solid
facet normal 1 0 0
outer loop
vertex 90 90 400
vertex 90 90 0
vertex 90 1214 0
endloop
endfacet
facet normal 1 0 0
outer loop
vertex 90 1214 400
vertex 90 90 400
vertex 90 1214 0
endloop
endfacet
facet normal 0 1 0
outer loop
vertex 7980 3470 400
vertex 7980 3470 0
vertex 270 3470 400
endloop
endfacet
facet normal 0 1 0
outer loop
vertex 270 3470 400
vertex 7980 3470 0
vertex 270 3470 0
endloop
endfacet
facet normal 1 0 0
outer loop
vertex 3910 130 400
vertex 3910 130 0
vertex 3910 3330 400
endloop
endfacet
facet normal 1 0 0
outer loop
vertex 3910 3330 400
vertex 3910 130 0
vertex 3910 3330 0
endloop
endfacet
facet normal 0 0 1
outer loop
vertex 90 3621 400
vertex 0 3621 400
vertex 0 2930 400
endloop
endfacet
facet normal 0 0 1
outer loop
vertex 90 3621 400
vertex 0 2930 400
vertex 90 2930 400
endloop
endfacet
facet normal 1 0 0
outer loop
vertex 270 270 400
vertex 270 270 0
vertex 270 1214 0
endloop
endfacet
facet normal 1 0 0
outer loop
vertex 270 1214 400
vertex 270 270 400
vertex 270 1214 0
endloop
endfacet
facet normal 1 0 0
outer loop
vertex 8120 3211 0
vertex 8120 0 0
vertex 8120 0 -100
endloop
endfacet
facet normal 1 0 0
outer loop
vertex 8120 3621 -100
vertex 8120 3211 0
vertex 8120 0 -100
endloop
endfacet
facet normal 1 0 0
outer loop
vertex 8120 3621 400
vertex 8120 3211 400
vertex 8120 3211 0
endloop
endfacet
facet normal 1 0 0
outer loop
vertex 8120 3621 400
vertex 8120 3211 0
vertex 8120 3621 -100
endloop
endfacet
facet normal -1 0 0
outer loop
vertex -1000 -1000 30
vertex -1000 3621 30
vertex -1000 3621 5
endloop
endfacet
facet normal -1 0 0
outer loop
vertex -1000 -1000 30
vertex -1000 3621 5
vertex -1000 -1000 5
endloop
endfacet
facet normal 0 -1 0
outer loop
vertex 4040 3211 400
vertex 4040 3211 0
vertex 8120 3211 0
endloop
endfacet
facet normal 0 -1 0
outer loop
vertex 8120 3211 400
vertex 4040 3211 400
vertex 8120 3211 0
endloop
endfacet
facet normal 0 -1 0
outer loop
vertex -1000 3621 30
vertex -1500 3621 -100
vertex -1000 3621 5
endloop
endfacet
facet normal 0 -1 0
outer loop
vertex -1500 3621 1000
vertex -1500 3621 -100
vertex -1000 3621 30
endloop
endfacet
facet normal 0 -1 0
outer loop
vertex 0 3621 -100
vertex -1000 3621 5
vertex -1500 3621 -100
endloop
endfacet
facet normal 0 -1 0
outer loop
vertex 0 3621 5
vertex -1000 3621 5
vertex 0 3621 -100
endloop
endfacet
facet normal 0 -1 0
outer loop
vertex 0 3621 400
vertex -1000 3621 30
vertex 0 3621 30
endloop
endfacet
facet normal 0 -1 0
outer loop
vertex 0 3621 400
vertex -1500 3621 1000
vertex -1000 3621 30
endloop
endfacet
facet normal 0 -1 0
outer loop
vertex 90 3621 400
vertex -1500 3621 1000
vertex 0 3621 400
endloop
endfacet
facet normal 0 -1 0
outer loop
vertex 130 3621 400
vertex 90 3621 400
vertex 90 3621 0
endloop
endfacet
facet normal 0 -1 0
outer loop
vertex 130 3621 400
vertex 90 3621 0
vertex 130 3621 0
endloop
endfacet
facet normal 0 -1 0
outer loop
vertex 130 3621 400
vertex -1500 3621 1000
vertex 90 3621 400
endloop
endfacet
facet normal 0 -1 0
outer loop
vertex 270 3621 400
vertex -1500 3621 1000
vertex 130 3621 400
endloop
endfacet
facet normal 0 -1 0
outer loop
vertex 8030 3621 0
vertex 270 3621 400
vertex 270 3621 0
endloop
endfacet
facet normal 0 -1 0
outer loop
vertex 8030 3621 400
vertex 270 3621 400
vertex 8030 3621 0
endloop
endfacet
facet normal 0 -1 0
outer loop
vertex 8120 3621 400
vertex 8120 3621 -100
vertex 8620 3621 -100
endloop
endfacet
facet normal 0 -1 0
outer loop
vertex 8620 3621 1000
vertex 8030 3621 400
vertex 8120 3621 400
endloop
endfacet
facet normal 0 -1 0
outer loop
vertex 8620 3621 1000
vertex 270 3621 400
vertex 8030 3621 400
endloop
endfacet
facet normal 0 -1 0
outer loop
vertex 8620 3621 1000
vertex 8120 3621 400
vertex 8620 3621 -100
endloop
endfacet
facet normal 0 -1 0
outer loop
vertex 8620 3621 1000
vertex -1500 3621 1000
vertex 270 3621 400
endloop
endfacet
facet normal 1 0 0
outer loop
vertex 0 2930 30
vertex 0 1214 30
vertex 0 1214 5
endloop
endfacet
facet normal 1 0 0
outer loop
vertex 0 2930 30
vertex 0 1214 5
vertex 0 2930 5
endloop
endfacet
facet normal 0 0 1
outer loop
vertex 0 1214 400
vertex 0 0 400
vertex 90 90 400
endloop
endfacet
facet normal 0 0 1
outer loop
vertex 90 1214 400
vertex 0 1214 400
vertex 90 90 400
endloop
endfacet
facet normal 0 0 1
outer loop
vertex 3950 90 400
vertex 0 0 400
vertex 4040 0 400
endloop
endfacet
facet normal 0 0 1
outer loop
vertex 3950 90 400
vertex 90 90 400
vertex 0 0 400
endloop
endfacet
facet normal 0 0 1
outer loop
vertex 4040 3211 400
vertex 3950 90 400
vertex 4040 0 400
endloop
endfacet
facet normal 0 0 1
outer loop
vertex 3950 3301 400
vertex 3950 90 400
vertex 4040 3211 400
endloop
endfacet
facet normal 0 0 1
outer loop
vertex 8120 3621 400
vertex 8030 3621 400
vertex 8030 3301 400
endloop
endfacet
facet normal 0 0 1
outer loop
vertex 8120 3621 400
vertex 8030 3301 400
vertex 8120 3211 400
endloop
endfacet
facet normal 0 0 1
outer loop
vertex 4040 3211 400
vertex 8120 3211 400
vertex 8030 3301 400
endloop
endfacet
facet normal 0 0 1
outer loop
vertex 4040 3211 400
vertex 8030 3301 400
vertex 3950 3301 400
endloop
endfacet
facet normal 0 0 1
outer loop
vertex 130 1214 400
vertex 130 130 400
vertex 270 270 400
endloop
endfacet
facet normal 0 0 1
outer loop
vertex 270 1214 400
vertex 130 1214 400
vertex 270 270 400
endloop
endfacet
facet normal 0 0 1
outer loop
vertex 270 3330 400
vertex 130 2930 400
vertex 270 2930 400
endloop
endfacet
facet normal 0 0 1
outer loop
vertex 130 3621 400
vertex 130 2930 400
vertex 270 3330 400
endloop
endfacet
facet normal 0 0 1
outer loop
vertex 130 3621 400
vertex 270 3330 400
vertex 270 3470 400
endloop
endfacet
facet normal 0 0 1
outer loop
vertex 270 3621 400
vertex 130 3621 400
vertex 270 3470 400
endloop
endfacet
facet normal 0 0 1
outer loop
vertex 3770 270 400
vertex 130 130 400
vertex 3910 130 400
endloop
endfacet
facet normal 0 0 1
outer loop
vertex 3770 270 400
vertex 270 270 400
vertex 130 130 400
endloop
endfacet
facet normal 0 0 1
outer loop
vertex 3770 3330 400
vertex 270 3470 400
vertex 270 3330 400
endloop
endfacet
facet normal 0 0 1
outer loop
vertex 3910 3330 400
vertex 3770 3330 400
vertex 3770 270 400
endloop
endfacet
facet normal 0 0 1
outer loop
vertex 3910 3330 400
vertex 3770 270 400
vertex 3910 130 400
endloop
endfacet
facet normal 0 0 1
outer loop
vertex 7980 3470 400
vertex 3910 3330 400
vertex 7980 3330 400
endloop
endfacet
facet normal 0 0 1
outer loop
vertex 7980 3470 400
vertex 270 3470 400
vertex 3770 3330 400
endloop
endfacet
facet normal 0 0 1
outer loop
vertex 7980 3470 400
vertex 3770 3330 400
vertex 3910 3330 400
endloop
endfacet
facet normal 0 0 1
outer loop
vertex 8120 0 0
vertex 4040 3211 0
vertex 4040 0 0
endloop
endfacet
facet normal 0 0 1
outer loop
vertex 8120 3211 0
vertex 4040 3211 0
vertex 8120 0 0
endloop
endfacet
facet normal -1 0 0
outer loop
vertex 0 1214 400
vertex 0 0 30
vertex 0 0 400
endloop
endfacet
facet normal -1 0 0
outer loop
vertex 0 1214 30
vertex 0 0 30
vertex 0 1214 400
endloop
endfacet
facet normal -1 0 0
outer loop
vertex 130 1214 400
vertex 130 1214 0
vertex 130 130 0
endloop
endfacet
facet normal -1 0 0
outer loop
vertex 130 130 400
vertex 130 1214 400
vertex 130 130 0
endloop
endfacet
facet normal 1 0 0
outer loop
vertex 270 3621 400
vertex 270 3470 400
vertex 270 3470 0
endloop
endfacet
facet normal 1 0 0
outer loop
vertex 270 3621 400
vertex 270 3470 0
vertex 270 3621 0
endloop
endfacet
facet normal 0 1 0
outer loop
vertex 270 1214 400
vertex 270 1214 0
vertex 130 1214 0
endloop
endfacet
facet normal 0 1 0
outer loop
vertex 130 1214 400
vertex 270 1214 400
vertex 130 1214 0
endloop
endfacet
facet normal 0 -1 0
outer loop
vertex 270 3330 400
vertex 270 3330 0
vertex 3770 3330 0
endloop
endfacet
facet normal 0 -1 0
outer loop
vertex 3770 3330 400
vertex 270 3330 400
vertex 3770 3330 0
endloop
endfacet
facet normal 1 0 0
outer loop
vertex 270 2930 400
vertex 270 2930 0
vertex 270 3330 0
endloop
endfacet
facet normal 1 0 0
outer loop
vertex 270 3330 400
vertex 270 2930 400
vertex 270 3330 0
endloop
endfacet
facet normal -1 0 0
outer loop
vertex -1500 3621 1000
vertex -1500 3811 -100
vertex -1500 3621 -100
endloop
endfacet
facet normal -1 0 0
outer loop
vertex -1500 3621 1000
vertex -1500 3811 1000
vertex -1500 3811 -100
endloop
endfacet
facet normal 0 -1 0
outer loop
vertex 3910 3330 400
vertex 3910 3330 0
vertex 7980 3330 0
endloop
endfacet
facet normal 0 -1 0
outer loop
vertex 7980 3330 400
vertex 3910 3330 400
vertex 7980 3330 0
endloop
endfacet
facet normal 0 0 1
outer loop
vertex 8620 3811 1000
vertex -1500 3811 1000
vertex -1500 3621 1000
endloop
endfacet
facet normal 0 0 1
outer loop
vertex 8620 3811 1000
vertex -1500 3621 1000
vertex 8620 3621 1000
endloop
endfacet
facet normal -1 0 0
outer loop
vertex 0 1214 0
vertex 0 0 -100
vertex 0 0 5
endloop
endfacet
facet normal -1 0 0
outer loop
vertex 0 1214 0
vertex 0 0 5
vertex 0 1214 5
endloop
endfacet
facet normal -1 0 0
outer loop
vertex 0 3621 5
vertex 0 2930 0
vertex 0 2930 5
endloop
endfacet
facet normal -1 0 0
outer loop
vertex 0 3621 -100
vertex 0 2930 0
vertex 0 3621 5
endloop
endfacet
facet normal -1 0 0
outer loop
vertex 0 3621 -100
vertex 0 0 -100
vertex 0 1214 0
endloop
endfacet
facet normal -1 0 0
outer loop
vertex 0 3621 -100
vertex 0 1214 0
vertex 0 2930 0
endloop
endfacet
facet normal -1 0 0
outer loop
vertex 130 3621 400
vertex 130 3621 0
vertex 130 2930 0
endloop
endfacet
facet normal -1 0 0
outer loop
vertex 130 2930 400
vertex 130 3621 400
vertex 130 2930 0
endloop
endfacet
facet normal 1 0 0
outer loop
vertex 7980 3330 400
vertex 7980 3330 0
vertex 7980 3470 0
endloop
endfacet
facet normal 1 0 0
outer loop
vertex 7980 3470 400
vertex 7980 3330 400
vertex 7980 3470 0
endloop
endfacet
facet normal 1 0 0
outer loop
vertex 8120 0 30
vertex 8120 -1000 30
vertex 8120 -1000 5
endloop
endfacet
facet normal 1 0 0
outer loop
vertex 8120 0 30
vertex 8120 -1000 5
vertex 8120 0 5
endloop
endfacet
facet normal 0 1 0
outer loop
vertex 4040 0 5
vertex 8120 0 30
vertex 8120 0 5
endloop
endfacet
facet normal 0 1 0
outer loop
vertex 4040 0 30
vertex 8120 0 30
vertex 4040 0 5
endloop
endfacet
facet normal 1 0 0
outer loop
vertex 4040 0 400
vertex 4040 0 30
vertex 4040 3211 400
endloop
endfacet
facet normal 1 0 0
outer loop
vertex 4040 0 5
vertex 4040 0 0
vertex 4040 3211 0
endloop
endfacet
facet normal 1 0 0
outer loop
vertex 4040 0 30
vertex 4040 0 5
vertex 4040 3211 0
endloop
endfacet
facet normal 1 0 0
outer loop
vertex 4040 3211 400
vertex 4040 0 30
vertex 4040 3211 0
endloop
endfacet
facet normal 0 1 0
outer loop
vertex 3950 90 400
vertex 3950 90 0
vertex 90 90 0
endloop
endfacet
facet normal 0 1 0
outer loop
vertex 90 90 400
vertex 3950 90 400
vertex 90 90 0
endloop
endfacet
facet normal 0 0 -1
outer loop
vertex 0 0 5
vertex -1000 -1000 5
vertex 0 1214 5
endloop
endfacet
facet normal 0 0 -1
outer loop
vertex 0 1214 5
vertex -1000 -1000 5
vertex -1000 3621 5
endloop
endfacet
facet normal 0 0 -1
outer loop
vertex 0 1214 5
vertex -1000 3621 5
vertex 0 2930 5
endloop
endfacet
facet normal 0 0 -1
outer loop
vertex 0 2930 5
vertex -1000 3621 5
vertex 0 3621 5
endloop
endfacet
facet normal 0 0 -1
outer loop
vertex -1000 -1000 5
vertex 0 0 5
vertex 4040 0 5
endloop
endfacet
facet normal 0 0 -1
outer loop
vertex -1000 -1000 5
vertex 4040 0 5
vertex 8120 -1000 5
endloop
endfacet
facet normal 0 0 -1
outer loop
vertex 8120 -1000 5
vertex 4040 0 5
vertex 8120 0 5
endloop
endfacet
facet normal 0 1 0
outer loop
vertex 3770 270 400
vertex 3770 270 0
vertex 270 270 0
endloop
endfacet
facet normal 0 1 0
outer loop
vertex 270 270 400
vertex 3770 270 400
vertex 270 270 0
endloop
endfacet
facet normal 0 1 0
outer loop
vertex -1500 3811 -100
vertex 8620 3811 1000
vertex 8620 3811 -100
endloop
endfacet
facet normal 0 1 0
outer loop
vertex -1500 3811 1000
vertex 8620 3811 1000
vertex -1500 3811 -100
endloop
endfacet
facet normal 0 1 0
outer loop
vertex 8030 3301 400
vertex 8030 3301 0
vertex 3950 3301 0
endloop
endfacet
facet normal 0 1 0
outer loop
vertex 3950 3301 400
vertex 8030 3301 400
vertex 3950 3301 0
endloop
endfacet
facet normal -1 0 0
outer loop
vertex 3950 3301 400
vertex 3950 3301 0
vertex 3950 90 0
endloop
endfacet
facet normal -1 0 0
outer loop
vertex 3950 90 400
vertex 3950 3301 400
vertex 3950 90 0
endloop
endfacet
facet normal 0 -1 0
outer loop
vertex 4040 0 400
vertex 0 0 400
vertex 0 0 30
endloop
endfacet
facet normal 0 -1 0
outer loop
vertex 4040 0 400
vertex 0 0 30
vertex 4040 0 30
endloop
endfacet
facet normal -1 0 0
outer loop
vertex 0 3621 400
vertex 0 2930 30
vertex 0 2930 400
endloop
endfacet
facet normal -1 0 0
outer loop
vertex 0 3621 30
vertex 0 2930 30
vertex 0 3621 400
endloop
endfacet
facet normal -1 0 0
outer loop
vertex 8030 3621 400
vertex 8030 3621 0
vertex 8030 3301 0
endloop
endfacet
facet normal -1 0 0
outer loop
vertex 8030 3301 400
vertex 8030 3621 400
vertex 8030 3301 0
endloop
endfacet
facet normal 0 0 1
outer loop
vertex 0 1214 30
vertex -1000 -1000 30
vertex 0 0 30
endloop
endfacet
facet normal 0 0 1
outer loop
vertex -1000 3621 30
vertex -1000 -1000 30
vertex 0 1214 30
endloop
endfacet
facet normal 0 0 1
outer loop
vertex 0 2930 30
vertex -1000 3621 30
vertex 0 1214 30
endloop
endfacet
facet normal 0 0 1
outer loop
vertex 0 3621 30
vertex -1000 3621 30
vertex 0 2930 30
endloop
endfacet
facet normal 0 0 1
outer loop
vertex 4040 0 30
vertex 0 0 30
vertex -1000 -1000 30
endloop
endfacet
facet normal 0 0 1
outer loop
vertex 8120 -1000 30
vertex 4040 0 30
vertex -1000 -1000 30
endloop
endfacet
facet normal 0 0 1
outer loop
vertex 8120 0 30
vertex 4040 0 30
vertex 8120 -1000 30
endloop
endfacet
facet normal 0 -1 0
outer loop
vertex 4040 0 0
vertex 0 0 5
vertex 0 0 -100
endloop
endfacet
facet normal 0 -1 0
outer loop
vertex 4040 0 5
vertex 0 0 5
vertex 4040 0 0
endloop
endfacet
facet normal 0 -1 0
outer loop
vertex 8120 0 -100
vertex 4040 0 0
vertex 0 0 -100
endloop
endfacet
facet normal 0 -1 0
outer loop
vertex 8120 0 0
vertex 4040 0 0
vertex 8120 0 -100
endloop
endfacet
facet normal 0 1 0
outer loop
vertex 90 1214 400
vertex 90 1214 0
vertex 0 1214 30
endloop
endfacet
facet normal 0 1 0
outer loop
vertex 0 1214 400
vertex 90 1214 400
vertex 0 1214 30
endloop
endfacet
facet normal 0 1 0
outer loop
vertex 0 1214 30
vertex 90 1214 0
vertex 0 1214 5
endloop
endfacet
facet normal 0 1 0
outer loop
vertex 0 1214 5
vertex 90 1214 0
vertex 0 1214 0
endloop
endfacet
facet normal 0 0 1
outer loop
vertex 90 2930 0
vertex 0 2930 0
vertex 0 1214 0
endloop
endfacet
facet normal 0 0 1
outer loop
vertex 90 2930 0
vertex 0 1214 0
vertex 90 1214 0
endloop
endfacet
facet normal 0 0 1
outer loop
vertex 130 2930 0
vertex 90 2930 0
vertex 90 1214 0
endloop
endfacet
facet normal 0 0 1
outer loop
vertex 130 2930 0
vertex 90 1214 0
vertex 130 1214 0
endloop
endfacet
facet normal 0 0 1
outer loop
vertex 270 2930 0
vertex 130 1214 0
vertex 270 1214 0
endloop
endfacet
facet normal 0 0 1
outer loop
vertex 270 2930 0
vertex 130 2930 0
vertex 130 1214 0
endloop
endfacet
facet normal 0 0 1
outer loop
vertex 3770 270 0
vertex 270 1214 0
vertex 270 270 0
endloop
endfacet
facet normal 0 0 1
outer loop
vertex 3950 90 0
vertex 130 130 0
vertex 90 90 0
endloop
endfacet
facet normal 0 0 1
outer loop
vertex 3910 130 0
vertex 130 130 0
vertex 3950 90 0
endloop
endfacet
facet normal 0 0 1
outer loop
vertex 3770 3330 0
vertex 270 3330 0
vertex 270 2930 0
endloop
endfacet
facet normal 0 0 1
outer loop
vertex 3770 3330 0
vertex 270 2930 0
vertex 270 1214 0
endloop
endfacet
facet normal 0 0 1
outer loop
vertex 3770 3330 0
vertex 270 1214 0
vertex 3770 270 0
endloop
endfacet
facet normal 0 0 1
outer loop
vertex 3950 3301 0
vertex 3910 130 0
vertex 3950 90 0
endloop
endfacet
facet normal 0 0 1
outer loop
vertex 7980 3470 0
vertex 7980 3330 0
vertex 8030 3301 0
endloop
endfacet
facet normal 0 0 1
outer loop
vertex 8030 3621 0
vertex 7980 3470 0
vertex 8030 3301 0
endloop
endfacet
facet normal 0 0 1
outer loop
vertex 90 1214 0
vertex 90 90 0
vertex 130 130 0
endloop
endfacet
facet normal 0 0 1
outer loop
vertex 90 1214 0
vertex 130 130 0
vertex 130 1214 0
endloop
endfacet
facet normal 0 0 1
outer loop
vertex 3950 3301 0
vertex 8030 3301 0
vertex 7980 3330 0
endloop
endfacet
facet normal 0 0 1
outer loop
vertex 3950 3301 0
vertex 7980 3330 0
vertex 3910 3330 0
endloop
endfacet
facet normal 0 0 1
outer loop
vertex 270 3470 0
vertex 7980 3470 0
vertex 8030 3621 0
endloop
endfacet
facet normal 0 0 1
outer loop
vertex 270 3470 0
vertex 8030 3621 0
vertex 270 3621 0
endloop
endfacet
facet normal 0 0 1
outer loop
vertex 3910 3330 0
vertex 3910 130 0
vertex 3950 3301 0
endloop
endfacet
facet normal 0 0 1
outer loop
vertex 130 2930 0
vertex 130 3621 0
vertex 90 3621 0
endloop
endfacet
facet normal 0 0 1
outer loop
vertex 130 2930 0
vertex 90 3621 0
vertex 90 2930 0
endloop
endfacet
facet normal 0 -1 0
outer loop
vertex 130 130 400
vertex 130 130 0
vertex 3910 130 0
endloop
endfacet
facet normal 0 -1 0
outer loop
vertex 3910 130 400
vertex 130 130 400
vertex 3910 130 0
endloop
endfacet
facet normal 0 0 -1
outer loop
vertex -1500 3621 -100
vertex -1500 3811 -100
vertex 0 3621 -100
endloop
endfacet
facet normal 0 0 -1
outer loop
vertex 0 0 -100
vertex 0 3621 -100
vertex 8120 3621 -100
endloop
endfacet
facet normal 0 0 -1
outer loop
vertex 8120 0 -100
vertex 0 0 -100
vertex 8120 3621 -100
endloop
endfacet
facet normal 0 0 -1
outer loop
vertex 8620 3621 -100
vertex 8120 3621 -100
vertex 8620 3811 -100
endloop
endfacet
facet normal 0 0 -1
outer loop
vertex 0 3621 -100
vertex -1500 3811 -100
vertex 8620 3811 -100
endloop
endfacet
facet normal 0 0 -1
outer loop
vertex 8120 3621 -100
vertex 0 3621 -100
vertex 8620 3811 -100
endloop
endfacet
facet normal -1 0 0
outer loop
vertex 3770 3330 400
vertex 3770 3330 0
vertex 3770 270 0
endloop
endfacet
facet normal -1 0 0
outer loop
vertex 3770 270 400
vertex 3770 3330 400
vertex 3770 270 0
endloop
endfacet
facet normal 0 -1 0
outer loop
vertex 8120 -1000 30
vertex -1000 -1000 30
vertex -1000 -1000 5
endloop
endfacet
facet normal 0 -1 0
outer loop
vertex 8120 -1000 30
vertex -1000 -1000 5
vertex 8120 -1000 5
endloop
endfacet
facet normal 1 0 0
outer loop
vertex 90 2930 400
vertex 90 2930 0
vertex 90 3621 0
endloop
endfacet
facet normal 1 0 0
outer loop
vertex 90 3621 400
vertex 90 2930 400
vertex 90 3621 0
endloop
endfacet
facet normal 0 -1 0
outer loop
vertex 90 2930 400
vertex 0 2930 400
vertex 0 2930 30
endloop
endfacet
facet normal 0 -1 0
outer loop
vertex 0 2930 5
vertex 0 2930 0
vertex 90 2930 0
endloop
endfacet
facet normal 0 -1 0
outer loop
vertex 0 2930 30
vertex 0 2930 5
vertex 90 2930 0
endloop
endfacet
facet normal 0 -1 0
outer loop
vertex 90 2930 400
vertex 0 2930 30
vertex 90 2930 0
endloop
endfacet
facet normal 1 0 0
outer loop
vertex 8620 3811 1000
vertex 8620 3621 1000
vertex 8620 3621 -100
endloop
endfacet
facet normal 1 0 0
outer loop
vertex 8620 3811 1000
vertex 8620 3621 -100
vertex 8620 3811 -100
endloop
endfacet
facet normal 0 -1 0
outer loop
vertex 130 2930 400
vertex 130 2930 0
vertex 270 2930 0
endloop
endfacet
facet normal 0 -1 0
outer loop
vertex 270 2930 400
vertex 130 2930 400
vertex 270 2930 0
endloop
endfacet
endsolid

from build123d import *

# Parameters (mm, degrees)
F0_W          = 8120
F0_H          = 3621
F1_DEPTH      = 100
F2_W          = 90
F2_H          = 691
F3_DEPTH      = 400
F6_DEPTH      = 25
F8_DEPTH      = 1000
F8_DEPTH_BACK = 100


with BuildPart() as f1:
    # F0 (on Top) → F1 (new body)
    with BuildSketch(Plane.XY):
        with Locations((4060, 1810.5)):
            Rectangle(F0_W, F0_H)
    extrude(amount=-F1_DEPTH)

    # F2 (on face) → F3 (join)
    with BuildSketch(Plane.XY):
        with Locations((45, 3275.5)):
            Rectangle(F2_W, F2_H)
        Polygon((270, 3621), (130, 3621), (130, 2930), (270, 2930), (270, 3330), (3770, 3330), (3770, 270), (270, 270), (270, 1214), (130, 1214), (130, 130), (3910, 130), (3910, 3330), (7980, 3330), (7980, 3470), (270, 3470), align=None)
        Polygon((90, 1214), (0, 1214), (0, 0), (4040, 0), (4040, 3211), (8120, 3211), (8120, 3621), (8030, 3621), (8030, 3301), (3950, 3301), (3950, 90), (90, 90), align=None)
    extrude(amount=F3_DEPTH)

    # F5 (on offset) → F6 (join)
    with BuildSketch(Plane.XY.offset(30)):
        Polygon((0, 0), (0, 3621), (-1000, 3621), (-1000, -1000), (8120, -1000), (8120, 0), align=None)
    extrude(amount=-F6_DEPTH)

    # F7 (on face) → F8 (join, two sides)
    with BuildSketch(Plane.XY) as f8_sk:
        Polygon((-1500, 3811), (-1500, 3621), (90, 3621), (130, 3621), (270, 3621), (8030, 3621), (8620, 3621), (8620, 3811), align=None)
    extrude(amount=F8_DEPTH)
    extrude(f8_sk.sketch, amount=-F8_DEPTH_BACK)


solid = f1.part
